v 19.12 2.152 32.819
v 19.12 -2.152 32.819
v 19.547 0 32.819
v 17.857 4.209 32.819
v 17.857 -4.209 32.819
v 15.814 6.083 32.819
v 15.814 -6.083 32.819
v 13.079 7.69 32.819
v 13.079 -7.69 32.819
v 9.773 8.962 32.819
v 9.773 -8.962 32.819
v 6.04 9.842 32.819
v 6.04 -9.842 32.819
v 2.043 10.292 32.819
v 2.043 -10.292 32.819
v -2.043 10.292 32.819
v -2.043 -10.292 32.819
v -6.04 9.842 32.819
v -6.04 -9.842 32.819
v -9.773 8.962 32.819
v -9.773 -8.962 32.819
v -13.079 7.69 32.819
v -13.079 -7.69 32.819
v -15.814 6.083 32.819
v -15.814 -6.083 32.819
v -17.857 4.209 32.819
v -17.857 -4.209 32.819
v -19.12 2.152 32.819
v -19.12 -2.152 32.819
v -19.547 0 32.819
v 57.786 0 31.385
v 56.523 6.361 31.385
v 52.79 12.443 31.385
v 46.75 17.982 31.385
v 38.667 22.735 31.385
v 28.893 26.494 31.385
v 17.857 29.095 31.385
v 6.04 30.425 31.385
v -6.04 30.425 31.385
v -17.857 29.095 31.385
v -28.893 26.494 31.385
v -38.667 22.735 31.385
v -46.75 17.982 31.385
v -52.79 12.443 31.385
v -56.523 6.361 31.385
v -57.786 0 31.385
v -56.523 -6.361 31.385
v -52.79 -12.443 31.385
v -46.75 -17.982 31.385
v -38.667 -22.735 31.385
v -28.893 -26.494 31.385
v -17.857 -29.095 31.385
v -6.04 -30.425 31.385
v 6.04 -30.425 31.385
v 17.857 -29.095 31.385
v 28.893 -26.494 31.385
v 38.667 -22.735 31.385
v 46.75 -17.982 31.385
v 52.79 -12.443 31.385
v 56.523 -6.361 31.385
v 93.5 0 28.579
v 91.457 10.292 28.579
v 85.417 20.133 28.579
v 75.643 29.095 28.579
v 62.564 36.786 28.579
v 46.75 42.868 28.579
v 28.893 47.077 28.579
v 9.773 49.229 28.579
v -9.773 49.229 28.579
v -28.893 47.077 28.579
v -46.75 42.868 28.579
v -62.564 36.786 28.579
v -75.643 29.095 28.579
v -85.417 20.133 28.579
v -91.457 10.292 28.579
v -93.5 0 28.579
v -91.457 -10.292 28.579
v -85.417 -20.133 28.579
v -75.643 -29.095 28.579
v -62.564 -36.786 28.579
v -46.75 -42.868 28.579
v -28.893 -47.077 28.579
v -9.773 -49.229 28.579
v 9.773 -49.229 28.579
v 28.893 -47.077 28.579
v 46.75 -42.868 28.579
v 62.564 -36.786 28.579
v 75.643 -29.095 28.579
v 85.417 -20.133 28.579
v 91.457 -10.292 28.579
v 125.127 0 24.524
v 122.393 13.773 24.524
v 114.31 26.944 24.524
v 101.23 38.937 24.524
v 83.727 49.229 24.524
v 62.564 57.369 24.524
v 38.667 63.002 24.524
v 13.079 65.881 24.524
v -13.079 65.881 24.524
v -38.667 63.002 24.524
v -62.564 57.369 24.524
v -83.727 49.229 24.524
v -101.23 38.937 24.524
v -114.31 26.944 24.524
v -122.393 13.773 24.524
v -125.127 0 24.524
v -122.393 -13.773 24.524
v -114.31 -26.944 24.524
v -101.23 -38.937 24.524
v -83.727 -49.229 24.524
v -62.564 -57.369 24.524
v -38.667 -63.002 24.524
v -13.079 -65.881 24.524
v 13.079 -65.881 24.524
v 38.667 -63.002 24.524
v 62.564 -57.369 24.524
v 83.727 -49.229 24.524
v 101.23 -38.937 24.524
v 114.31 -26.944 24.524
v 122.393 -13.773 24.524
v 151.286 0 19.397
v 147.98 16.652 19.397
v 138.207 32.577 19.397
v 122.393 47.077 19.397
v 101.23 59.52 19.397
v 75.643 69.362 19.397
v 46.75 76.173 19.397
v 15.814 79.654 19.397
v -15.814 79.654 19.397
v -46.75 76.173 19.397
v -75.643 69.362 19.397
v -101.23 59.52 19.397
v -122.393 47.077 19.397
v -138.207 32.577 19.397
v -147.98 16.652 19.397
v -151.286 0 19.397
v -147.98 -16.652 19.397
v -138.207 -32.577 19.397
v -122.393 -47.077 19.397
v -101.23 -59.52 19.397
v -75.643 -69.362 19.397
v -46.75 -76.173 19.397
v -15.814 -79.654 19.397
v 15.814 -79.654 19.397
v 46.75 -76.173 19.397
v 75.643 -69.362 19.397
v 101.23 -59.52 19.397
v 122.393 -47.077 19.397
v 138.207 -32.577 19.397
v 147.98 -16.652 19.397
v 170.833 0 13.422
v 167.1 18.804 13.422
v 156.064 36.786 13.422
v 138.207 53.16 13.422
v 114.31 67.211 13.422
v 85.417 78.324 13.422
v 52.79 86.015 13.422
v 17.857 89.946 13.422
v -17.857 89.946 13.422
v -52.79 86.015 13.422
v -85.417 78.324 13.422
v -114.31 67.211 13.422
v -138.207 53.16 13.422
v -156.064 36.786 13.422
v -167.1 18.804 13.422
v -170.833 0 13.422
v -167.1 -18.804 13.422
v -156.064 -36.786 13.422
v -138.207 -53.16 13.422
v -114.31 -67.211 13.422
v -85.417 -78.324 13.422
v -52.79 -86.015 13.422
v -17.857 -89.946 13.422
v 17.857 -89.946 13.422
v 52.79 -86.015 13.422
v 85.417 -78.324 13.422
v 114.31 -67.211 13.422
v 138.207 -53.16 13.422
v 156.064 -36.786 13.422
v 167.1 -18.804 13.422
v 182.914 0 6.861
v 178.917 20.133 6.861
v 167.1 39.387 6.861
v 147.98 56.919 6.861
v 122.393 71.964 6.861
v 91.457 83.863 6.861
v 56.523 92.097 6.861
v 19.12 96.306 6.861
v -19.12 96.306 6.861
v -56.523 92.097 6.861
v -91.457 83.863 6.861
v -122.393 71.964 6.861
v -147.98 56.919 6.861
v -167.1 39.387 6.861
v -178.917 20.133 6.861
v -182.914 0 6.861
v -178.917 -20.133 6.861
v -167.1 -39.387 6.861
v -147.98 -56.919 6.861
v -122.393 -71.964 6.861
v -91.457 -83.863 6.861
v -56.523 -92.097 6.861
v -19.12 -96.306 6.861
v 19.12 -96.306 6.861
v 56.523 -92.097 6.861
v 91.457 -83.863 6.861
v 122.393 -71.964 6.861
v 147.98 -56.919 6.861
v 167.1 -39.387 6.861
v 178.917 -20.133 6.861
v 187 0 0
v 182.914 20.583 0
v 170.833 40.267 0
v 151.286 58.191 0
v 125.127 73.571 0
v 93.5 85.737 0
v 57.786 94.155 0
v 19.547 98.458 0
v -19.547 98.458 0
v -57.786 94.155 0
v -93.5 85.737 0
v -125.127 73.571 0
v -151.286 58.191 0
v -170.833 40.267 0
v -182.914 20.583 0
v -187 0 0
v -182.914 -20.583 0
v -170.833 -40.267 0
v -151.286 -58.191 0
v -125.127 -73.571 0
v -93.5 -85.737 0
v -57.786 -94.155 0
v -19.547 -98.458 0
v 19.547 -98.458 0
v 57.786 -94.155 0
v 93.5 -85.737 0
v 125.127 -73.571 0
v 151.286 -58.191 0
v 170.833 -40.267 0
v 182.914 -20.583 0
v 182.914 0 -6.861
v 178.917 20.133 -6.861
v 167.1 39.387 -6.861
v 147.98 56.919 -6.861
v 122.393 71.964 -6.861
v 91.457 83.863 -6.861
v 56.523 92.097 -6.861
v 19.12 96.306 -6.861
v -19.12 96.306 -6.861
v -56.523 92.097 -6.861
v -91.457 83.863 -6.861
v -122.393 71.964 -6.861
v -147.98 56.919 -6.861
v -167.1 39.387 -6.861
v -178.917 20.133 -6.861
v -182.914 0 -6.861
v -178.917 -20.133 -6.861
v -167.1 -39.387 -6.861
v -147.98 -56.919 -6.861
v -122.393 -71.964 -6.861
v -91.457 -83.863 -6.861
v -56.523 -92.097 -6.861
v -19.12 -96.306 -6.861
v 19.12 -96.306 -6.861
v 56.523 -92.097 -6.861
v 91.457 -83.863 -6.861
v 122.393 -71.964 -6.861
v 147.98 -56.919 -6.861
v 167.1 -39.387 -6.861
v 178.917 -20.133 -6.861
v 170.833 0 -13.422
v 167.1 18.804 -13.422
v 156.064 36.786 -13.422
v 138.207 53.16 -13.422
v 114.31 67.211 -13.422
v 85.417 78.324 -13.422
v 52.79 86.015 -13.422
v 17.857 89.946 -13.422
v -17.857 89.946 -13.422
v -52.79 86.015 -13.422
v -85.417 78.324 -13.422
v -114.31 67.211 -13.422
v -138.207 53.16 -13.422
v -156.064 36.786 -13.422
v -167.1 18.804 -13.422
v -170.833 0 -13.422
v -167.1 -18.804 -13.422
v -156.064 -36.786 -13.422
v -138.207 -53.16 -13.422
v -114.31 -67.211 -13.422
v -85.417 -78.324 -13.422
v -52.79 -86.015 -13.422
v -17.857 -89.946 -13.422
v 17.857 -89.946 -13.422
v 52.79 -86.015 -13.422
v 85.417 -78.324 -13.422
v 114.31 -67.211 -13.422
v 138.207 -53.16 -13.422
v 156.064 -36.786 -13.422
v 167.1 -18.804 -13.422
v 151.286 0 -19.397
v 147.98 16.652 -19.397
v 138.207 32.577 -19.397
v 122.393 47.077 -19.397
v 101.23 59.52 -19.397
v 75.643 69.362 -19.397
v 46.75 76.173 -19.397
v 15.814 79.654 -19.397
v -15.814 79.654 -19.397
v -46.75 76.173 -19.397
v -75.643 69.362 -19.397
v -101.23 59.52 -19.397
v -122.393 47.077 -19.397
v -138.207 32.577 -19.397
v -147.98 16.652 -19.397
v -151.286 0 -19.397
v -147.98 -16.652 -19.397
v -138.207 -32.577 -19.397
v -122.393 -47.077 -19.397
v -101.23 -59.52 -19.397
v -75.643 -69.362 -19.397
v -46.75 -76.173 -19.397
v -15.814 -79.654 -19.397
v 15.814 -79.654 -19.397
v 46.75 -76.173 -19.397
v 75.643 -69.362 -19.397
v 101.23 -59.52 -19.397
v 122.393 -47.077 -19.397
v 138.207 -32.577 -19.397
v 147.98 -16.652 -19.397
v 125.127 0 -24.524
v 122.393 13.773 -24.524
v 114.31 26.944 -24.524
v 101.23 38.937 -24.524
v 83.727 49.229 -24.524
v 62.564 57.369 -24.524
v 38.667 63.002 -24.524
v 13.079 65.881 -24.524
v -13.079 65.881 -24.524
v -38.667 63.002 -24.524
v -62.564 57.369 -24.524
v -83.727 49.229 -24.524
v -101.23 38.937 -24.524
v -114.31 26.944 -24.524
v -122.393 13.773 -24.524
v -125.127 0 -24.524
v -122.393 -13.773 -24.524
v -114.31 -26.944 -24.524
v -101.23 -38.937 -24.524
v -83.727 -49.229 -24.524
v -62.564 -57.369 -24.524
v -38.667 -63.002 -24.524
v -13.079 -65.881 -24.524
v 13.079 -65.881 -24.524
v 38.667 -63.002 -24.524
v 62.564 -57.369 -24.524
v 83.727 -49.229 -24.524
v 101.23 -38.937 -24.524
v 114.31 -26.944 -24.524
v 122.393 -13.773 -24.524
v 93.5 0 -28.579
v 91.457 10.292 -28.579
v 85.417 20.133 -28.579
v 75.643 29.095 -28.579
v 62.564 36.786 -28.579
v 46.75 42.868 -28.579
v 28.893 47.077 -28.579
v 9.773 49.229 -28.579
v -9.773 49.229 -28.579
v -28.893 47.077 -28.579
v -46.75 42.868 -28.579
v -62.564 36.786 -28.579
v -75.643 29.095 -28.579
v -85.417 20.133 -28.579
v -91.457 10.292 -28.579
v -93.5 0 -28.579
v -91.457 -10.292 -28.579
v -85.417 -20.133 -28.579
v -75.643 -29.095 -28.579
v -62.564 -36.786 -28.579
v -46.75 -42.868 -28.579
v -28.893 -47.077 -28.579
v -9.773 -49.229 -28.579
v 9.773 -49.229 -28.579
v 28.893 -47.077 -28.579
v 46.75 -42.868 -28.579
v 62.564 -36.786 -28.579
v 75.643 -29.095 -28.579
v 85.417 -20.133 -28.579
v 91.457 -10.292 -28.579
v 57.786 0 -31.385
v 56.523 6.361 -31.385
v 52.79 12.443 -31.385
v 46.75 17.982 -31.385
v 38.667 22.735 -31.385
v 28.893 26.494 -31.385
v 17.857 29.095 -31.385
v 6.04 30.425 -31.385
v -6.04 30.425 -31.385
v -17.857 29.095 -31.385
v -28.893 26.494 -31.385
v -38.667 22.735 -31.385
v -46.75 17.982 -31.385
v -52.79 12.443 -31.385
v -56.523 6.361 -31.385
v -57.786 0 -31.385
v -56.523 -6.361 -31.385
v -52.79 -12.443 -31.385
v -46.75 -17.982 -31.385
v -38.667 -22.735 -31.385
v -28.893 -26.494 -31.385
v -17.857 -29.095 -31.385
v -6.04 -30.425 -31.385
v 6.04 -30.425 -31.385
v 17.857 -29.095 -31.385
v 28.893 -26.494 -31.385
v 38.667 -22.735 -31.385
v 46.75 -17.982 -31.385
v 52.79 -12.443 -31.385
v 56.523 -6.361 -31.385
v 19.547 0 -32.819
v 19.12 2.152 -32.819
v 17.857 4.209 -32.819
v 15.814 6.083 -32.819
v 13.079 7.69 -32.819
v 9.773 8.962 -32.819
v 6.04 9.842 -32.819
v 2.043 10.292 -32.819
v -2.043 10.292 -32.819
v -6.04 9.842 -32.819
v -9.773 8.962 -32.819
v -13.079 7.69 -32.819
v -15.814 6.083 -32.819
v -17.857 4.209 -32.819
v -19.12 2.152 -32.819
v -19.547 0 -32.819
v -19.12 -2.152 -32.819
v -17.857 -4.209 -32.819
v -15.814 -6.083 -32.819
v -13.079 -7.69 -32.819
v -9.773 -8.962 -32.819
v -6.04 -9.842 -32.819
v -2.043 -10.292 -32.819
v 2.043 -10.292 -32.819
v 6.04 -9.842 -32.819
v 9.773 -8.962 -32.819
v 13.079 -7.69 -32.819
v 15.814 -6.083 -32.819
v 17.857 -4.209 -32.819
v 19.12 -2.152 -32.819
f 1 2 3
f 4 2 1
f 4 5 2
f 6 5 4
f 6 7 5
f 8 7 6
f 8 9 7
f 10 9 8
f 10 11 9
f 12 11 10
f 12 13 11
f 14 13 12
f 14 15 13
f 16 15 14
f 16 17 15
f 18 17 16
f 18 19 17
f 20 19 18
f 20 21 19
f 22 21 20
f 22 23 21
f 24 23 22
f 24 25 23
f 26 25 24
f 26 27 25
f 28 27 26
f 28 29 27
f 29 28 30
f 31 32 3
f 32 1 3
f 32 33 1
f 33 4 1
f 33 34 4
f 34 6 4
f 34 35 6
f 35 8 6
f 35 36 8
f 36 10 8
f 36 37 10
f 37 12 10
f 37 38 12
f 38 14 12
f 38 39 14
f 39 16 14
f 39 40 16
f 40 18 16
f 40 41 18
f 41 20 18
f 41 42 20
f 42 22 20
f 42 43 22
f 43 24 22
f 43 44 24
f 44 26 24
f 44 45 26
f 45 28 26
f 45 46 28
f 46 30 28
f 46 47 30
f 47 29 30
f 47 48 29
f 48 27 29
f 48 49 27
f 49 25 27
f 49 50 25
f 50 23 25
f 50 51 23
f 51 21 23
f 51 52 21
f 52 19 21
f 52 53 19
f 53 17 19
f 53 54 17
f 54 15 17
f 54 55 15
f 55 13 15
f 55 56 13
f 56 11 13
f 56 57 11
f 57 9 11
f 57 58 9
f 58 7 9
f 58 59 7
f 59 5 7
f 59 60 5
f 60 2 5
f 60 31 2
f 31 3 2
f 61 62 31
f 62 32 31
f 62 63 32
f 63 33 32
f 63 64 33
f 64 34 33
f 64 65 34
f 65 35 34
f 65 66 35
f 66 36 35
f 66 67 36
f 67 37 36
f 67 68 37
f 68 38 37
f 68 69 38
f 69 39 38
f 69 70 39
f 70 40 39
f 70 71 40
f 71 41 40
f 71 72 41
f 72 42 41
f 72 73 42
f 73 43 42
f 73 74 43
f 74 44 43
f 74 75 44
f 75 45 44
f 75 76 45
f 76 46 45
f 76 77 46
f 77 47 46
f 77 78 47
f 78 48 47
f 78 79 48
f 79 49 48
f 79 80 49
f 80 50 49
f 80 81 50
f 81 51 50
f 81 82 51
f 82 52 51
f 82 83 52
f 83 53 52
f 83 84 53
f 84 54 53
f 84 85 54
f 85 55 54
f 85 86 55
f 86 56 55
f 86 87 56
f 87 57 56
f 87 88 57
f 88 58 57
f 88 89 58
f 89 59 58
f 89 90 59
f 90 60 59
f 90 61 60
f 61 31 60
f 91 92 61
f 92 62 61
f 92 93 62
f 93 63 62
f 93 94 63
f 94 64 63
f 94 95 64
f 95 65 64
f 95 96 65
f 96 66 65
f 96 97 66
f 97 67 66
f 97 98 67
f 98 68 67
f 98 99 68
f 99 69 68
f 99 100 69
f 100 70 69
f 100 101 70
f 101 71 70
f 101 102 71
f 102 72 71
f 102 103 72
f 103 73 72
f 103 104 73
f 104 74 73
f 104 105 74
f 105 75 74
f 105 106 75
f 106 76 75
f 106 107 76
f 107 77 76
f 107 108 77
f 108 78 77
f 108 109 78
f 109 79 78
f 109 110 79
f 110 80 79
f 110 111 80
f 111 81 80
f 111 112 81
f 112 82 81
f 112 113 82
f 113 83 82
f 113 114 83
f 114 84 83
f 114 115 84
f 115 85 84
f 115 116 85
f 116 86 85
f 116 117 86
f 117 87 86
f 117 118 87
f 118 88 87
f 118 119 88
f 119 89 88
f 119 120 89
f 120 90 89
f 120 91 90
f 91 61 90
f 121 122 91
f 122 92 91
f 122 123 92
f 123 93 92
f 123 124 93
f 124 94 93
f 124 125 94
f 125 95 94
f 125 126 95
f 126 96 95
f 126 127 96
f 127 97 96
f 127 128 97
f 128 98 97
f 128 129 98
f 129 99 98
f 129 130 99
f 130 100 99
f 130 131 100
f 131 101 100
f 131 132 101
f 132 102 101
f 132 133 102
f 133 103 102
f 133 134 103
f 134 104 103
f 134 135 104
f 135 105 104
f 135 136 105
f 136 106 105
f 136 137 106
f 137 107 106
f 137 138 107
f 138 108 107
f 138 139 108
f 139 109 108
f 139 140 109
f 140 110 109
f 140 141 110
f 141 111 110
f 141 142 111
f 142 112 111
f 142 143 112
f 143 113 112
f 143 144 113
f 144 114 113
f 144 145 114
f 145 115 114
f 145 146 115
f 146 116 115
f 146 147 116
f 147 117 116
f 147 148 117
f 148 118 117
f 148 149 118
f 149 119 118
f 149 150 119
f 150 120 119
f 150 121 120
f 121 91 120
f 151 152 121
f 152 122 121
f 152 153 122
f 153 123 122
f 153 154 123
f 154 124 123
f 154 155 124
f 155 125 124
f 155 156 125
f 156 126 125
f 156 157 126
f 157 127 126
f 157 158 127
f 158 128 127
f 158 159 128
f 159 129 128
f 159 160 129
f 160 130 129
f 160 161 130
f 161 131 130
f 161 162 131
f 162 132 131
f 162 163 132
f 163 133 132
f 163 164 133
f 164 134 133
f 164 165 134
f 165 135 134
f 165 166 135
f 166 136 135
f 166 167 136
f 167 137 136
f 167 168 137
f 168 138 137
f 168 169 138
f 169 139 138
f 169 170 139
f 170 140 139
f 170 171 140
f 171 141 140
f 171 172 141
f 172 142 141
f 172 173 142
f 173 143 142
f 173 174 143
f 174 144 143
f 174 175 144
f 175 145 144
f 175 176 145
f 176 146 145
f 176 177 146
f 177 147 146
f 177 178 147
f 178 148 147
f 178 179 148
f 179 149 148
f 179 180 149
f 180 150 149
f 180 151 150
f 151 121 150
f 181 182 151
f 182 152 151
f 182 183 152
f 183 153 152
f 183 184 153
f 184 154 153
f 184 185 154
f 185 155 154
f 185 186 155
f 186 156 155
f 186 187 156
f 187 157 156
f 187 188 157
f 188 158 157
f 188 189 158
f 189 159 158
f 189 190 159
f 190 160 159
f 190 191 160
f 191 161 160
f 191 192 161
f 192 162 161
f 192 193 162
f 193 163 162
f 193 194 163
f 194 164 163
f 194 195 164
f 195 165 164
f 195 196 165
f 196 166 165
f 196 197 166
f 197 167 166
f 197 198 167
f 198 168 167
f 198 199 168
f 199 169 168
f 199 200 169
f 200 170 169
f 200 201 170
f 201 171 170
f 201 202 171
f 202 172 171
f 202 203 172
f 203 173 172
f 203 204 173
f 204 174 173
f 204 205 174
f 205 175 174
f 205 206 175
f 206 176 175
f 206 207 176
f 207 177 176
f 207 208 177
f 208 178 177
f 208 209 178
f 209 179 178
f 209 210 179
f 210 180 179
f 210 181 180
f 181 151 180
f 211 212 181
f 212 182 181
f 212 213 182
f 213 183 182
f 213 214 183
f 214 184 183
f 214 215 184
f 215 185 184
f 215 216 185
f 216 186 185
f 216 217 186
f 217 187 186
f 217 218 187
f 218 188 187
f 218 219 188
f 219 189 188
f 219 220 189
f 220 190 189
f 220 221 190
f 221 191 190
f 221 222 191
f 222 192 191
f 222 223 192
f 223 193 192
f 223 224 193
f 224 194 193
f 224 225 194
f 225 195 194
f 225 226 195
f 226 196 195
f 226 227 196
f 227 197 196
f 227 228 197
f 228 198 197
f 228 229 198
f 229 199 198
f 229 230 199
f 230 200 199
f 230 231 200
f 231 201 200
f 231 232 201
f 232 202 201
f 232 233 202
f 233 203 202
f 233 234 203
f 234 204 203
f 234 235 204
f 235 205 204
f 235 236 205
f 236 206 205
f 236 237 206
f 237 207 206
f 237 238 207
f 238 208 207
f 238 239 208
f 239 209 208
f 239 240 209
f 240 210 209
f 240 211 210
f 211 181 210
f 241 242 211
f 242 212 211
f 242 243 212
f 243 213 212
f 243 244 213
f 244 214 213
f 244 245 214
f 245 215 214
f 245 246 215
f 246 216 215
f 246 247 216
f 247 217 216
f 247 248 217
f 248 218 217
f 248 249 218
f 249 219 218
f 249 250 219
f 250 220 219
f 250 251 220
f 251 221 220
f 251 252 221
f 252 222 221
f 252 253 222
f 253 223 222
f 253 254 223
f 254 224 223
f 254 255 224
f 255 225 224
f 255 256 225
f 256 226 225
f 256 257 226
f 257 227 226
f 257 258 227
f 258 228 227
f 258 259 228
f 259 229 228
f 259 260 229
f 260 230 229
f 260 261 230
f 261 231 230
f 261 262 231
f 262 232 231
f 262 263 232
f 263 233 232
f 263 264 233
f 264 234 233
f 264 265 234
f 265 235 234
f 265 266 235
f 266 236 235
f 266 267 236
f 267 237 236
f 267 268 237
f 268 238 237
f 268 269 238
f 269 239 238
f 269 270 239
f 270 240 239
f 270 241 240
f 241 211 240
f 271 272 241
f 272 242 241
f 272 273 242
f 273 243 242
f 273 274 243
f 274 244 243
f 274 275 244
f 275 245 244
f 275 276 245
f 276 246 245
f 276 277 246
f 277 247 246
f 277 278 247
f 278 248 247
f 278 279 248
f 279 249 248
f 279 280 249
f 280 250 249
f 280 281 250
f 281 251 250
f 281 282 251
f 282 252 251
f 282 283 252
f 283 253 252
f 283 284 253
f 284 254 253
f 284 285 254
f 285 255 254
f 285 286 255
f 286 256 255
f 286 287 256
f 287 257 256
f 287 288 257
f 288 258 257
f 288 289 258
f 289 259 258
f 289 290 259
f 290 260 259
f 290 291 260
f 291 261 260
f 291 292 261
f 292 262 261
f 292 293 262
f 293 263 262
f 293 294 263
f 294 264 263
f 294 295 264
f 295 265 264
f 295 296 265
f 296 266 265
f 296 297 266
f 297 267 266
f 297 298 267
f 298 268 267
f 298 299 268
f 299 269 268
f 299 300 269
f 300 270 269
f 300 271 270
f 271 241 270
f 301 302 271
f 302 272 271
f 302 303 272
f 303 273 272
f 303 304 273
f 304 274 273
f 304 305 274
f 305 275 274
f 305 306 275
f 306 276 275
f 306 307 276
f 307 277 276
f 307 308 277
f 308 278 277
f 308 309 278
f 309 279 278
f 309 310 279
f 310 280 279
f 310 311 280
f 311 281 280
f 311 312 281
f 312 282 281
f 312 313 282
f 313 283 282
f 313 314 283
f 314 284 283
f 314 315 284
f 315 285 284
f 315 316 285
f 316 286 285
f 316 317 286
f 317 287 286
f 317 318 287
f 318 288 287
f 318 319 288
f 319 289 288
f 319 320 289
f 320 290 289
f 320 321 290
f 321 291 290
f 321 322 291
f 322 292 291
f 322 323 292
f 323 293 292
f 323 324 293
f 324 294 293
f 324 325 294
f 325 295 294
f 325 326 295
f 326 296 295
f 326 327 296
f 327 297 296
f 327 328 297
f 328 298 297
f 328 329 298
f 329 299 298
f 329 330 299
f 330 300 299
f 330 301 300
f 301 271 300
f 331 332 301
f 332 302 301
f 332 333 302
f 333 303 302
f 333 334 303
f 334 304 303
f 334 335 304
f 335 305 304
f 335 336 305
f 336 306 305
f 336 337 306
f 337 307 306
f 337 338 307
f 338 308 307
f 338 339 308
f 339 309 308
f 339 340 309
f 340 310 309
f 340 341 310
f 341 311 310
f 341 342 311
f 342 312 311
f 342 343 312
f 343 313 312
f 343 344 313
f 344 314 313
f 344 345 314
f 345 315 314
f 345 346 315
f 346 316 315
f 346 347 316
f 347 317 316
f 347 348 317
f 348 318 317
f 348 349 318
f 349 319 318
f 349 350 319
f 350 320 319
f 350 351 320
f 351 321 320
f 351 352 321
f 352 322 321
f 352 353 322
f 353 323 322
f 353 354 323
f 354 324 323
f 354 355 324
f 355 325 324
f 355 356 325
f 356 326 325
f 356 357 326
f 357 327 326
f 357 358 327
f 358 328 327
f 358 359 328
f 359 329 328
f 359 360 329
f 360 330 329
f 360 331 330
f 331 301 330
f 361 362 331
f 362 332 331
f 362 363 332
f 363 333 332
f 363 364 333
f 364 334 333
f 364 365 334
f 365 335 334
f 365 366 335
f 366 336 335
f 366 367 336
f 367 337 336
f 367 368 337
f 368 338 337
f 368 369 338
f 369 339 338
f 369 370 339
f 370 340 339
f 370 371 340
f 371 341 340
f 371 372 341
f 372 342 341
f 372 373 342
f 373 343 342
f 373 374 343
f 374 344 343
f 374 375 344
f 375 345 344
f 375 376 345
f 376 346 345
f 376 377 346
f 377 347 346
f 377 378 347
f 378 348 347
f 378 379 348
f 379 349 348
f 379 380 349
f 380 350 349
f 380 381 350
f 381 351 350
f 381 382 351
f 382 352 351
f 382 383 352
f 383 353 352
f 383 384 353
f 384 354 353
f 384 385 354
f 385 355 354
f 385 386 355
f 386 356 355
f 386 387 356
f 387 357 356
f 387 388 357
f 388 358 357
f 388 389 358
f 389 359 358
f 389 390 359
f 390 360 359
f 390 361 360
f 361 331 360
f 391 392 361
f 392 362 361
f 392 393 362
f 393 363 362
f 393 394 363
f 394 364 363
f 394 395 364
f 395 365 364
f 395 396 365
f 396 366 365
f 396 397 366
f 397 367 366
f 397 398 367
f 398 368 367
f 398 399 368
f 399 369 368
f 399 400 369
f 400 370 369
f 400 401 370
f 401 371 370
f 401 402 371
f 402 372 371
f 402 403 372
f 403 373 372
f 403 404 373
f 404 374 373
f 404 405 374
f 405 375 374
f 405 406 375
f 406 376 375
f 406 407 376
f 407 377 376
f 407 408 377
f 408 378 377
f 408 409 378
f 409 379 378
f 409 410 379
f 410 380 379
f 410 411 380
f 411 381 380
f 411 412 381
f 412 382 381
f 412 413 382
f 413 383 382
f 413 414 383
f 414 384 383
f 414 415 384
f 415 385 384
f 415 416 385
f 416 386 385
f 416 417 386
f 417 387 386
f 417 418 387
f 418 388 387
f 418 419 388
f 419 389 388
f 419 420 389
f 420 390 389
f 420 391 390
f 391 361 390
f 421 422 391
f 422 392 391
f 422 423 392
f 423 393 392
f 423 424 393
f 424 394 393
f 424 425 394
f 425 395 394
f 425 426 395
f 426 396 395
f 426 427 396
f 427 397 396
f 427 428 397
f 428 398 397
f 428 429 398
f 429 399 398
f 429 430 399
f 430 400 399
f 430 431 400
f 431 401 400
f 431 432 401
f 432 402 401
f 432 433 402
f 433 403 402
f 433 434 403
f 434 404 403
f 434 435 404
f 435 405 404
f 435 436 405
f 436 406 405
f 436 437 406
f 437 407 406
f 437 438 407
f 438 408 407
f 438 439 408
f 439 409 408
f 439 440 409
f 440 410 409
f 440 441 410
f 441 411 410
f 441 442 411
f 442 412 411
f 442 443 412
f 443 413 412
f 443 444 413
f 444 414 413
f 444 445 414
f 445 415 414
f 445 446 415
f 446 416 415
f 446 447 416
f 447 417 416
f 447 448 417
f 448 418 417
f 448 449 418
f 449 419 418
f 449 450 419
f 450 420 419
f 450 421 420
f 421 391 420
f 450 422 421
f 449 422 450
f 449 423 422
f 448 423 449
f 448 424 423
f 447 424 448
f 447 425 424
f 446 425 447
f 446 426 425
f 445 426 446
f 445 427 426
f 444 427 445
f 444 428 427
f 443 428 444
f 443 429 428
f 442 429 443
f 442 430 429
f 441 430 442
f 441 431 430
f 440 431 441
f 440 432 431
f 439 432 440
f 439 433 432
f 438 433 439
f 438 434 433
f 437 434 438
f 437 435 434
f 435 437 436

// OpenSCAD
// Generated by SolidPython 1.0.1 on 2020-07-29 00:46:53


scale(v = [17, 9, 3]) {
	sphere(r = 11);
}
/***********************************************
*********      SolidPython code:      **********
************************************************
 
# import packages: SolidPython
from solid import *
from solid.utils import *
from itertools import chain, combinations, permutations


class Resize:

    def __init__(self, scad_file):
        self.scad_file = scad_file
        #self.scad_file = import_scad(scad_file)
        # cone/cylinder param:
        self.r1 = 0
        self.r2 = 0
        self.h = 0
        # rectangular prism param:
        self.w = 0
        self.l = 0
        # ellipse param:
        self.r = 0

    # import OpenScad code (file name corresponds to shape)


    # classify shape + parameters
    def assign(self, param1, param2, param3):
        if self.scad_file == 'cone.scad':
            self.r1 = param1
            self.r2 = param2
            self.h = param3
        elif self.scad_file == 'cylinder.scad':
            self.r1 = param1
            self.r2 = param2
            self.h = param3
        elif self.scad_file == 'rectangularPrism.scad':
            self.h = param1
            self.l = param2
            self.w = param3
        else:
            self.r = param1
            self.h = param2

    # resize parameters
    def iterate(self):
        x = range(3, 20, 2)
        i = 1
        if self.scad_file == 'cone.scad':
            tempList = list(permutations(x, 2))
            for temp in tempList:
                param1 = temp[0]
                param2 = temp[1]
                filepath = 'produced_scad_files/' + 'cone' + str(param1) + '_' + str(param2) + '_' + '.scad'
                scad_render_to_file(cylinder(h=param1, r1=param2, r2=0), filepath)

        elif self.scad_file == 'cylinder.scad':
            tempList = list(permutations(x, 3))
            for temp in tempList:
                param1 = temp[0]
                param2 = temp[1]
                filepath = 'produced_scad_files/' + 'cylinder' + str(param1) + '_' + str(param2) + '_' + '.scad'
                scad_render_to_file(cylinder(h=param1, r1=param2, r2=param2), filepath)

        elif self.scad_file == 'rectangularPrism.scad':
            tempList = list(permutations(x, 3))
            for temp in tempList:
                param1 = temp[0]
                param2 = temp[1]
                param3 = temp[2]
                filepath = 'produced_scad_files/' + 'rectangularPrism' + str(param1) + '_' + str(param2) + '_' + str(
                    param3) + '.scad'
                scad_render_to_file(cube(size=(param1, param2, param3)), filepath)

        elif self.scad_file == 'ellipse.scad':
            tempList = list(permutations(x, 4))
            for temp in tempList:
                param1 = temp[0]
                param2 = temp[1]
                param3 = temp[2]
                param4 = temp[3]
                filepath = 'produced_scad_files/' + 'ellipse' + str(param1) + '_' + str(param2) + '_' + str(param3) + '_' + str(param4) + '.scad'
                scad_render_to_file(scale([param1, param2, param3])(sphere(r=param4)), filepath)

    def render_to_scadfile(self):
        scad_render_to_file(scad, 'example.scad') 
 
************************************************/
